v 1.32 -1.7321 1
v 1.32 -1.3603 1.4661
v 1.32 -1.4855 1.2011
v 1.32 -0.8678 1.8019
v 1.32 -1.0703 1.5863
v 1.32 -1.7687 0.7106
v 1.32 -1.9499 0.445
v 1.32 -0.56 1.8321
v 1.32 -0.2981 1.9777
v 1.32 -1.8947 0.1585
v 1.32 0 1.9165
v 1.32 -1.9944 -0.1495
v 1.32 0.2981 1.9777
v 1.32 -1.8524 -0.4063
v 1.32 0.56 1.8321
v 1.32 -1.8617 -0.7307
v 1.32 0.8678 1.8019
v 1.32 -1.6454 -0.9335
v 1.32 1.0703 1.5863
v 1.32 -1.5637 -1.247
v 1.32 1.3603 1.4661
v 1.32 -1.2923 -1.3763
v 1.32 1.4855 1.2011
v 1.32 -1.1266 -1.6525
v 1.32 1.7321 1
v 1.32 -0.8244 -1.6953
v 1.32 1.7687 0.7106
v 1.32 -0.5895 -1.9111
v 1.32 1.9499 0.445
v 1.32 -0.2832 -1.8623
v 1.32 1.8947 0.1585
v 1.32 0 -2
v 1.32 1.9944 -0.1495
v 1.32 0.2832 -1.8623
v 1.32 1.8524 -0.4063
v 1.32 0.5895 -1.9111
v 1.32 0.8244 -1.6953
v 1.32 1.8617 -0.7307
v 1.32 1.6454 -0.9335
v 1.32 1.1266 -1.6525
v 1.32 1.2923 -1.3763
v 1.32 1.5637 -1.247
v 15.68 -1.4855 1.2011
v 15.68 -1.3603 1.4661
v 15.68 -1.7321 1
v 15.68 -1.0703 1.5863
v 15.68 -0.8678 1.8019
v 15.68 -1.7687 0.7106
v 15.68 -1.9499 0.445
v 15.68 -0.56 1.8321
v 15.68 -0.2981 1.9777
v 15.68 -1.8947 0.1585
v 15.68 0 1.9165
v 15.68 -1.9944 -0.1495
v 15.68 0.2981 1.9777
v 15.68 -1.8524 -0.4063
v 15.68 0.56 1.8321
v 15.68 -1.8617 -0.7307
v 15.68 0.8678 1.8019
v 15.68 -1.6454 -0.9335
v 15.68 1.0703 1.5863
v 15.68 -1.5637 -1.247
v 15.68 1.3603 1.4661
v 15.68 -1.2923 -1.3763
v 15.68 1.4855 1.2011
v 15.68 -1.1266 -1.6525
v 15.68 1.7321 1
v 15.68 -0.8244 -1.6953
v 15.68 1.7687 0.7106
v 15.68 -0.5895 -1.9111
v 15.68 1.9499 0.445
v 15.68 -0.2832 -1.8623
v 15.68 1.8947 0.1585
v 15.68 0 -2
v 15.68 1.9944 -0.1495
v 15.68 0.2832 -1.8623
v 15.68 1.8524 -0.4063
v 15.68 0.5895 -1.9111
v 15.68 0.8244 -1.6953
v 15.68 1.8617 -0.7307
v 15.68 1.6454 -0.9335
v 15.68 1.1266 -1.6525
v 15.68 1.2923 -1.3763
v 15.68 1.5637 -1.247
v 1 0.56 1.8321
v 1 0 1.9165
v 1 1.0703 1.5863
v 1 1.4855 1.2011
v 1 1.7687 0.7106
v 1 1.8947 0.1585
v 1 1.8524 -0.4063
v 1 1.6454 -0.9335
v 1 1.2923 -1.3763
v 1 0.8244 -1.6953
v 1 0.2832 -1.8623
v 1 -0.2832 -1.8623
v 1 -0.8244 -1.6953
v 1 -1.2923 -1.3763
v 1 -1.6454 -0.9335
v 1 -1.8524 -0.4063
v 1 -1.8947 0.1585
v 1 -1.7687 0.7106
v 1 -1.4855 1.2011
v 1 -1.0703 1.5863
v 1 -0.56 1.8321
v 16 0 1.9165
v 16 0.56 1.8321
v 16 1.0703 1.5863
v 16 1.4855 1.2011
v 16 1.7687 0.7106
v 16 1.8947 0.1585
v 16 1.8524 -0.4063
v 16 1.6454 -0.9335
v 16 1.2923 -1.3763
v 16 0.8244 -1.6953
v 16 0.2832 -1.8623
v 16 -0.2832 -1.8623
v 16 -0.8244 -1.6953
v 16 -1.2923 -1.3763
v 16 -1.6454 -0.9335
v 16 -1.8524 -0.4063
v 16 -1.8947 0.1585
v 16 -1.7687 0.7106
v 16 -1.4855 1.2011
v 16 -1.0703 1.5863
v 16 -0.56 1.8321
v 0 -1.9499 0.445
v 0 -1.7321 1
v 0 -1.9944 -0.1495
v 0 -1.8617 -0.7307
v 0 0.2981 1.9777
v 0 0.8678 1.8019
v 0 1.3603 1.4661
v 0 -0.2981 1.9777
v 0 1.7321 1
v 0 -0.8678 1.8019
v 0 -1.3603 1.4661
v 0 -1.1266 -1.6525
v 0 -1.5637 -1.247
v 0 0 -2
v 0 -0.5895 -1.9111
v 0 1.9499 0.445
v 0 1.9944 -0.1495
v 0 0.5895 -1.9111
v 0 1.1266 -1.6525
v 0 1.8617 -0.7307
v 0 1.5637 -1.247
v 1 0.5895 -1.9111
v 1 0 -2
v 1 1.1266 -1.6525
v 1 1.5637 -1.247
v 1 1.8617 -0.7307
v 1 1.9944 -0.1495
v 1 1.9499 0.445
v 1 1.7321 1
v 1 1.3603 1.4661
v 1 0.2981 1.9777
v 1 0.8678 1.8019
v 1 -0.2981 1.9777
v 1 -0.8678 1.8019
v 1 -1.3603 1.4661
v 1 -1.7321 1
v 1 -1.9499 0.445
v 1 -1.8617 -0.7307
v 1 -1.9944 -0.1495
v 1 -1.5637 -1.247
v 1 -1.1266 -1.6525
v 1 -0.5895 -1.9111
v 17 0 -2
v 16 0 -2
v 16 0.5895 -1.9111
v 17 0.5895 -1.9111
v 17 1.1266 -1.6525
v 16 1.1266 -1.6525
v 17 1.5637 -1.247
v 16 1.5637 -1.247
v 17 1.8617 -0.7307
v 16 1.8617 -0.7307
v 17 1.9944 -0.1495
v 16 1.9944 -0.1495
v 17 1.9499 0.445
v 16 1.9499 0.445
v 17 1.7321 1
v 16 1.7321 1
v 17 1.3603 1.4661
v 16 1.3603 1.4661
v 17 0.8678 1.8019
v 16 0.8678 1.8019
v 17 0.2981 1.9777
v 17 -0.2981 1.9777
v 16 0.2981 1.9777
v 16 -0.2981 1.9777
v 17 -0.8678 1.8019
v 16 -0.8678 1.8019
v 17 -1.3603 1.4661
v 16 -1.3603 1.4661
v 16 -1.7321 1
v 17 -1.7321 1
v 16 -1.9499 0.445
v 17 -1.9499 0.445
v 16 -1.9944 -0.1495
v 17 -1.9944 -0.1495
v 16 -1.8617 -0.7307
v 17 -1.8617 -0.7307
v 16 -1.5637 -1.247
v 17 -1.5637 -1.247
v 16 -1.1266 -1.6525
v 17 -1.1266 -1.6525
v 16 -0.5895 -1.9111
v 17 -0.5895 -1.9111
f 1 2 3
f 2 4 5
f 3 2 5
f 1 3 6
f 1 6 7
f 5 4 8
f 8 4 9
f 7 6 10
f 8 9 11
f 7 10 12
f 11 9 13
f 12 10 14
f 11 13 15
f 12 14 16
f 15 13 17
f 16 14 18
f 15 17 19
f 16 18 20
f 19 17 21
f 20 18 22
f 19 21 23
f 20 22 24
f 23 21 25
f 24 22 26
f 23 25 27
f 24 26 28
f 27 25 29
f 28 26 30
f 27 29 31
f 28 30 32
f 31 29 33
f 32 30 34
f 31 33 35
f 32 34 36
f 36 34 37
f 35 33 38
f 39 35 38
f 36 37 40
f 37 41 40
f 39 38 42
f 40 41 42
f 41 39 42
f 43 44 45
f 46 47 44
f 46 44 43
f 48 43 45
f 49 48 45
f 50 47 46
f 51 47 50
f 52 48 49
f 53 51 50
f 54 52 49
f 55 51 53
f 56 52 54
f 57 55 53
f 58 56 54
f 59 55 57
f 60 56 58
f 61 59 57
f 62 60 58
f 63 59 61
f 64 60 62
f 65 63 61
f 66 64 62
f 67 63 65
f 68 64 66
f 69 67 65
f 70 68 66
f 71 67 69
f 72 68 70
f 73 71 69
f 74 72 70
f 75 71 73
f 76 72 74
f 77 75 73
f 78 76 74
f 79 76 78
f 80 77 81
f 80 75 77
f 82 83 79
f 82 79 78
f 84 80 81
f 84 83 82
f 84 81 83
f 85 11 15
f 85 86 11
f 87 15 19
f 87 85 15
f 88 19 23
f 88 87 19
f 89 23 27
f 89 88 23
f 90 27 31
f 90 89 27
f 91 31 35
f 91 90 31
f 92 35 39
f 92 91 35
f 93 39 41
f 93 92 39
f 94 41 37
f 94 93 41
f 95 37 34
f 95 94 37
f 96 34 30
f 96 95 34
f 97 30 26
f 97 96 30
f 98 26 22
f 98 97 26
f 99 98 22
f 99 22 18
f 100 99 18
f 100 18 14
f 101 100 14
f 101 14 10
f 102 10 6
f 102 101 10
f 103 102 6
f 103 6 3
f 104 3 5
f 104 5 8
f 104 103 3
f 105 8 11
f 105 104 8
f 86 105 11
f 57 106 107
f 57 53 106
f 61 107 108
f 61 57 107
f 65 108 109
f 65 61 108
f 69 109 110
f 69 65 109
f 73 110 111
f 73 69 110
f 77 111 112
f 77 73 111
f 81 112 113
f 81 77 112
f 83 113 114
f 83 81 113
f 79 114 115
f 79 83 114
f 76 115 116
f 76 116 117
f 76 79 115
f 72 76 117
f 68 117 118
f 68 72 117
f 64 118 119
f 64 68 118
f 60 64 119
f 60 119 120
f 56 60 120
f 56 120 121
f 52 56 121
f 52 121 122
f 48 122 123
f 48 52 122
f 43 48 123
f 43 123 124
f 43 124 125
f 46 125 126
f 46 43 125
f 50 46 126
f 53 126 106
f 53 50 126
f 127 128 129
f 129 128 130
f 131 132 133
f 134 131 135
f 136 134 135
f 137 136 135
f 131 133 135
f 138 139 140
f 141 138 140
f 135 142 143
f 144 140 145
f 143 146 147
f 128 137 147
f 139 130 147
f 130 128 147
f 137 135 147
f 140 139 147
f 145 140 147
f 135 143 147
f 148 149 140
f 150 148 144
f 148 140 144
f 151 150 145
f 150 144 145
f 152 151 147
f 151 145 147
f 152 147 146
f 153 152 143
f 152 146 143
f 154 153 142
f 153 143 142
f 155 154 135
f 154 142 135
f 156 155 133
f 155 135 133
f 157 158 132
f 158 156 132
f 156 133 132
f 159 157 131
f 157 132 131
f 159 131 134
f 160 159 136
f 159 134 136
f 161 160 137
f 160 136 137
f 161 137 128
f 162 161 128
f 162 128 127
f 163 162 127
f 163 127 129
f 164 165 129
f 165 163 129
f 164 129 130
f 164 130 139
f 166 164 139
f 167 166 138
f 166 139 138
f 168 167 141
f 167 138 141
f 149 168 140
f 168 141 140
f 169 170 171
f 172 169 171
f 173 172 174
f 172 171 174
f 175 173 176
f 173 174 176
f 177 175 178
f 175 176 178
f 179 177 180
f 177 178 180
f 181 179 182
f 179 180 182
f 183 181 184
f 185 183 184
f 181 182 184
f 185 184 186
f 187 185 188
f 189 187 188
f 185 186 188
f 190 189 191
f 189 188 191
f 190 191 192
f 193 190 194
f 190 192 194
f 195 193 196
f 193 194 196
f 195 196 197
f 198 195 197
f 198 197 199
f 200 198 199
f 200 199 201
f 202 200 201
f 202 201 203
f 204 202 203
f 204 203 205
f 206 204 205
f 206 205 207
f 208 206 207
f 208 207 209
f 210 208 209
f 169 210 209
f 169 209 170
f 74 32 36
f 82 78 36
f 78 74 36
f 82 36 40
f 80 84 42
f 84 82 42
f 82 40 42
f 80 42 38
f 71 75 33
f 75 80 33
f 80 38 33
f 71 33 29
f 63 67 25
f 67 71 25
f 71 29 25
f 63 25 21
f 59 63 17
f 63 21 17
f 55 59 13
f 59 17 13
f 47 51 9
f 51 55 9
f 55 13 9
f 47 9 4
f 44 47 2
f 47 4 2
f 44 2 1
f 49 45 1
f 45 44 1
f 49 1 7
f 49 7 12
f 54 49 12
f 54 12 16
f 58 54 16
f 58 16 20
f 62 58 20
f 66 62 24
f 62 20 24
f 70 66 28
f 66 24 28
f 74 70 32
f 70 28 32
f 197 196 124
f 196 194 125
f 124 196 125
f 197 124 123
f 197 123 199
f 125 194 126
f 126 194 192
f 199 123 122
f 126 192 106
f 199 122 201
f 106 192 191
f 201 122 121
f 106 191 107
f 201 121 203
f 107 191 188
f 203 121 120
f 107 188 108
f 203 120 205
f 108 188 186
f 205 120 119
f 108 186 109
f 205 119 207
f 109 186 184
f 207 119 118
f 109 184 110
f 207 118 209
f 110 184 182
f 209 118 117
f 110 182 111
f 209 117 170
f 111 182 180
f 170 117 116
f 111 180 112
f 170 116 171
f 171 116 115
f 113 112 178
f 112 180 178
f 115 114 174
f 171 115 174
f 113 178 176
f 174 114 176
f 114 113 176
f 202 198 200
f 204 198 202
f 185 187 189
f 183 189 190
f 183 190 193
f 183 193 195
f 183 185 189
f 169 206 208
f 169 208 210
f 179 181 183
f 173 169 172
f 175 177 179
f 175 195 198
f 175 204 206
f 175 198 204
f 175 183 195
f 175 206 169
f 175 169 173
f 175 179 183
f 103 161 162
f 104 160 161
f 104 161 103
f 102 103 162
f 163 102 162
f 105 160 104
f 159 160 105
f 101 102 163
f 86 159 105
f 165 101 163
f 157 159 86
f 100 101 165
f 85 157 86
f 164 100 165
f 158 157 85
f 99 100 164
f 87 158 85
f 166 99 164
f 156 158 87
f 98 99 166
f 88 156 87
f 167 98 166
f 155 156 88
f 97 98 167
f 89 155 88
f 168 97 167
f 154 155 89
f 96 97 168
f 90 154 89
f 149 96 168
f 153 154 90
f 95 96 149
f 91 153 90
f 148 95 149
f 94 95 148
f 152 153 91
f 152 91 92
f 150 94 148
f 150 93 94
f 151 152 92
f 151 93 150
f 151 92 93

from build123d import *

# Parameters (mm, degrees)
SKETCH1_R           = 2
BOSS_EXTRUDE1_DEPTH = 17
SKETCH3_W           = 0.483504557
SKETCH3_H           = 0.32
SKETCH3_W_2         = 1.446691601


with BuildPart() as part:
    # Sketch1 → Boss-Extrude1 (new body)
    with BuildSketch(Plane(origin=(0, 0, 0), x_dir=(0, 0, -1), z_dir=(1, 0, 0))):
        Circle(SKETCH1_R)
    extrude(amount=BOSS_EXTRUDE1_DEPTH)

    # Sketch3 → Groove for ANSI B27.7 - 3AM1-4, Basic External Retaining Ring1 (revolve, cut)
    with BuildSketch(Plane(origin=(15, 0, 0), x_dir=(0, 0, 1), z_dir=(0, -1, 0))):
        with Locations((2.158247722, -0.84)):
            Rectangle(SKETCH3_W, SKETCH3_H)
        with Locations((2.639841244, 13.84)):
            Rectangle(SKETCH3_W_2, SKETCH3_H)
    revolve(axis=Axis((67.749749937, 0, 0.016495443), (-1, 0, 0)), mode=Mode.SUBTRACT)


solid = part.part
